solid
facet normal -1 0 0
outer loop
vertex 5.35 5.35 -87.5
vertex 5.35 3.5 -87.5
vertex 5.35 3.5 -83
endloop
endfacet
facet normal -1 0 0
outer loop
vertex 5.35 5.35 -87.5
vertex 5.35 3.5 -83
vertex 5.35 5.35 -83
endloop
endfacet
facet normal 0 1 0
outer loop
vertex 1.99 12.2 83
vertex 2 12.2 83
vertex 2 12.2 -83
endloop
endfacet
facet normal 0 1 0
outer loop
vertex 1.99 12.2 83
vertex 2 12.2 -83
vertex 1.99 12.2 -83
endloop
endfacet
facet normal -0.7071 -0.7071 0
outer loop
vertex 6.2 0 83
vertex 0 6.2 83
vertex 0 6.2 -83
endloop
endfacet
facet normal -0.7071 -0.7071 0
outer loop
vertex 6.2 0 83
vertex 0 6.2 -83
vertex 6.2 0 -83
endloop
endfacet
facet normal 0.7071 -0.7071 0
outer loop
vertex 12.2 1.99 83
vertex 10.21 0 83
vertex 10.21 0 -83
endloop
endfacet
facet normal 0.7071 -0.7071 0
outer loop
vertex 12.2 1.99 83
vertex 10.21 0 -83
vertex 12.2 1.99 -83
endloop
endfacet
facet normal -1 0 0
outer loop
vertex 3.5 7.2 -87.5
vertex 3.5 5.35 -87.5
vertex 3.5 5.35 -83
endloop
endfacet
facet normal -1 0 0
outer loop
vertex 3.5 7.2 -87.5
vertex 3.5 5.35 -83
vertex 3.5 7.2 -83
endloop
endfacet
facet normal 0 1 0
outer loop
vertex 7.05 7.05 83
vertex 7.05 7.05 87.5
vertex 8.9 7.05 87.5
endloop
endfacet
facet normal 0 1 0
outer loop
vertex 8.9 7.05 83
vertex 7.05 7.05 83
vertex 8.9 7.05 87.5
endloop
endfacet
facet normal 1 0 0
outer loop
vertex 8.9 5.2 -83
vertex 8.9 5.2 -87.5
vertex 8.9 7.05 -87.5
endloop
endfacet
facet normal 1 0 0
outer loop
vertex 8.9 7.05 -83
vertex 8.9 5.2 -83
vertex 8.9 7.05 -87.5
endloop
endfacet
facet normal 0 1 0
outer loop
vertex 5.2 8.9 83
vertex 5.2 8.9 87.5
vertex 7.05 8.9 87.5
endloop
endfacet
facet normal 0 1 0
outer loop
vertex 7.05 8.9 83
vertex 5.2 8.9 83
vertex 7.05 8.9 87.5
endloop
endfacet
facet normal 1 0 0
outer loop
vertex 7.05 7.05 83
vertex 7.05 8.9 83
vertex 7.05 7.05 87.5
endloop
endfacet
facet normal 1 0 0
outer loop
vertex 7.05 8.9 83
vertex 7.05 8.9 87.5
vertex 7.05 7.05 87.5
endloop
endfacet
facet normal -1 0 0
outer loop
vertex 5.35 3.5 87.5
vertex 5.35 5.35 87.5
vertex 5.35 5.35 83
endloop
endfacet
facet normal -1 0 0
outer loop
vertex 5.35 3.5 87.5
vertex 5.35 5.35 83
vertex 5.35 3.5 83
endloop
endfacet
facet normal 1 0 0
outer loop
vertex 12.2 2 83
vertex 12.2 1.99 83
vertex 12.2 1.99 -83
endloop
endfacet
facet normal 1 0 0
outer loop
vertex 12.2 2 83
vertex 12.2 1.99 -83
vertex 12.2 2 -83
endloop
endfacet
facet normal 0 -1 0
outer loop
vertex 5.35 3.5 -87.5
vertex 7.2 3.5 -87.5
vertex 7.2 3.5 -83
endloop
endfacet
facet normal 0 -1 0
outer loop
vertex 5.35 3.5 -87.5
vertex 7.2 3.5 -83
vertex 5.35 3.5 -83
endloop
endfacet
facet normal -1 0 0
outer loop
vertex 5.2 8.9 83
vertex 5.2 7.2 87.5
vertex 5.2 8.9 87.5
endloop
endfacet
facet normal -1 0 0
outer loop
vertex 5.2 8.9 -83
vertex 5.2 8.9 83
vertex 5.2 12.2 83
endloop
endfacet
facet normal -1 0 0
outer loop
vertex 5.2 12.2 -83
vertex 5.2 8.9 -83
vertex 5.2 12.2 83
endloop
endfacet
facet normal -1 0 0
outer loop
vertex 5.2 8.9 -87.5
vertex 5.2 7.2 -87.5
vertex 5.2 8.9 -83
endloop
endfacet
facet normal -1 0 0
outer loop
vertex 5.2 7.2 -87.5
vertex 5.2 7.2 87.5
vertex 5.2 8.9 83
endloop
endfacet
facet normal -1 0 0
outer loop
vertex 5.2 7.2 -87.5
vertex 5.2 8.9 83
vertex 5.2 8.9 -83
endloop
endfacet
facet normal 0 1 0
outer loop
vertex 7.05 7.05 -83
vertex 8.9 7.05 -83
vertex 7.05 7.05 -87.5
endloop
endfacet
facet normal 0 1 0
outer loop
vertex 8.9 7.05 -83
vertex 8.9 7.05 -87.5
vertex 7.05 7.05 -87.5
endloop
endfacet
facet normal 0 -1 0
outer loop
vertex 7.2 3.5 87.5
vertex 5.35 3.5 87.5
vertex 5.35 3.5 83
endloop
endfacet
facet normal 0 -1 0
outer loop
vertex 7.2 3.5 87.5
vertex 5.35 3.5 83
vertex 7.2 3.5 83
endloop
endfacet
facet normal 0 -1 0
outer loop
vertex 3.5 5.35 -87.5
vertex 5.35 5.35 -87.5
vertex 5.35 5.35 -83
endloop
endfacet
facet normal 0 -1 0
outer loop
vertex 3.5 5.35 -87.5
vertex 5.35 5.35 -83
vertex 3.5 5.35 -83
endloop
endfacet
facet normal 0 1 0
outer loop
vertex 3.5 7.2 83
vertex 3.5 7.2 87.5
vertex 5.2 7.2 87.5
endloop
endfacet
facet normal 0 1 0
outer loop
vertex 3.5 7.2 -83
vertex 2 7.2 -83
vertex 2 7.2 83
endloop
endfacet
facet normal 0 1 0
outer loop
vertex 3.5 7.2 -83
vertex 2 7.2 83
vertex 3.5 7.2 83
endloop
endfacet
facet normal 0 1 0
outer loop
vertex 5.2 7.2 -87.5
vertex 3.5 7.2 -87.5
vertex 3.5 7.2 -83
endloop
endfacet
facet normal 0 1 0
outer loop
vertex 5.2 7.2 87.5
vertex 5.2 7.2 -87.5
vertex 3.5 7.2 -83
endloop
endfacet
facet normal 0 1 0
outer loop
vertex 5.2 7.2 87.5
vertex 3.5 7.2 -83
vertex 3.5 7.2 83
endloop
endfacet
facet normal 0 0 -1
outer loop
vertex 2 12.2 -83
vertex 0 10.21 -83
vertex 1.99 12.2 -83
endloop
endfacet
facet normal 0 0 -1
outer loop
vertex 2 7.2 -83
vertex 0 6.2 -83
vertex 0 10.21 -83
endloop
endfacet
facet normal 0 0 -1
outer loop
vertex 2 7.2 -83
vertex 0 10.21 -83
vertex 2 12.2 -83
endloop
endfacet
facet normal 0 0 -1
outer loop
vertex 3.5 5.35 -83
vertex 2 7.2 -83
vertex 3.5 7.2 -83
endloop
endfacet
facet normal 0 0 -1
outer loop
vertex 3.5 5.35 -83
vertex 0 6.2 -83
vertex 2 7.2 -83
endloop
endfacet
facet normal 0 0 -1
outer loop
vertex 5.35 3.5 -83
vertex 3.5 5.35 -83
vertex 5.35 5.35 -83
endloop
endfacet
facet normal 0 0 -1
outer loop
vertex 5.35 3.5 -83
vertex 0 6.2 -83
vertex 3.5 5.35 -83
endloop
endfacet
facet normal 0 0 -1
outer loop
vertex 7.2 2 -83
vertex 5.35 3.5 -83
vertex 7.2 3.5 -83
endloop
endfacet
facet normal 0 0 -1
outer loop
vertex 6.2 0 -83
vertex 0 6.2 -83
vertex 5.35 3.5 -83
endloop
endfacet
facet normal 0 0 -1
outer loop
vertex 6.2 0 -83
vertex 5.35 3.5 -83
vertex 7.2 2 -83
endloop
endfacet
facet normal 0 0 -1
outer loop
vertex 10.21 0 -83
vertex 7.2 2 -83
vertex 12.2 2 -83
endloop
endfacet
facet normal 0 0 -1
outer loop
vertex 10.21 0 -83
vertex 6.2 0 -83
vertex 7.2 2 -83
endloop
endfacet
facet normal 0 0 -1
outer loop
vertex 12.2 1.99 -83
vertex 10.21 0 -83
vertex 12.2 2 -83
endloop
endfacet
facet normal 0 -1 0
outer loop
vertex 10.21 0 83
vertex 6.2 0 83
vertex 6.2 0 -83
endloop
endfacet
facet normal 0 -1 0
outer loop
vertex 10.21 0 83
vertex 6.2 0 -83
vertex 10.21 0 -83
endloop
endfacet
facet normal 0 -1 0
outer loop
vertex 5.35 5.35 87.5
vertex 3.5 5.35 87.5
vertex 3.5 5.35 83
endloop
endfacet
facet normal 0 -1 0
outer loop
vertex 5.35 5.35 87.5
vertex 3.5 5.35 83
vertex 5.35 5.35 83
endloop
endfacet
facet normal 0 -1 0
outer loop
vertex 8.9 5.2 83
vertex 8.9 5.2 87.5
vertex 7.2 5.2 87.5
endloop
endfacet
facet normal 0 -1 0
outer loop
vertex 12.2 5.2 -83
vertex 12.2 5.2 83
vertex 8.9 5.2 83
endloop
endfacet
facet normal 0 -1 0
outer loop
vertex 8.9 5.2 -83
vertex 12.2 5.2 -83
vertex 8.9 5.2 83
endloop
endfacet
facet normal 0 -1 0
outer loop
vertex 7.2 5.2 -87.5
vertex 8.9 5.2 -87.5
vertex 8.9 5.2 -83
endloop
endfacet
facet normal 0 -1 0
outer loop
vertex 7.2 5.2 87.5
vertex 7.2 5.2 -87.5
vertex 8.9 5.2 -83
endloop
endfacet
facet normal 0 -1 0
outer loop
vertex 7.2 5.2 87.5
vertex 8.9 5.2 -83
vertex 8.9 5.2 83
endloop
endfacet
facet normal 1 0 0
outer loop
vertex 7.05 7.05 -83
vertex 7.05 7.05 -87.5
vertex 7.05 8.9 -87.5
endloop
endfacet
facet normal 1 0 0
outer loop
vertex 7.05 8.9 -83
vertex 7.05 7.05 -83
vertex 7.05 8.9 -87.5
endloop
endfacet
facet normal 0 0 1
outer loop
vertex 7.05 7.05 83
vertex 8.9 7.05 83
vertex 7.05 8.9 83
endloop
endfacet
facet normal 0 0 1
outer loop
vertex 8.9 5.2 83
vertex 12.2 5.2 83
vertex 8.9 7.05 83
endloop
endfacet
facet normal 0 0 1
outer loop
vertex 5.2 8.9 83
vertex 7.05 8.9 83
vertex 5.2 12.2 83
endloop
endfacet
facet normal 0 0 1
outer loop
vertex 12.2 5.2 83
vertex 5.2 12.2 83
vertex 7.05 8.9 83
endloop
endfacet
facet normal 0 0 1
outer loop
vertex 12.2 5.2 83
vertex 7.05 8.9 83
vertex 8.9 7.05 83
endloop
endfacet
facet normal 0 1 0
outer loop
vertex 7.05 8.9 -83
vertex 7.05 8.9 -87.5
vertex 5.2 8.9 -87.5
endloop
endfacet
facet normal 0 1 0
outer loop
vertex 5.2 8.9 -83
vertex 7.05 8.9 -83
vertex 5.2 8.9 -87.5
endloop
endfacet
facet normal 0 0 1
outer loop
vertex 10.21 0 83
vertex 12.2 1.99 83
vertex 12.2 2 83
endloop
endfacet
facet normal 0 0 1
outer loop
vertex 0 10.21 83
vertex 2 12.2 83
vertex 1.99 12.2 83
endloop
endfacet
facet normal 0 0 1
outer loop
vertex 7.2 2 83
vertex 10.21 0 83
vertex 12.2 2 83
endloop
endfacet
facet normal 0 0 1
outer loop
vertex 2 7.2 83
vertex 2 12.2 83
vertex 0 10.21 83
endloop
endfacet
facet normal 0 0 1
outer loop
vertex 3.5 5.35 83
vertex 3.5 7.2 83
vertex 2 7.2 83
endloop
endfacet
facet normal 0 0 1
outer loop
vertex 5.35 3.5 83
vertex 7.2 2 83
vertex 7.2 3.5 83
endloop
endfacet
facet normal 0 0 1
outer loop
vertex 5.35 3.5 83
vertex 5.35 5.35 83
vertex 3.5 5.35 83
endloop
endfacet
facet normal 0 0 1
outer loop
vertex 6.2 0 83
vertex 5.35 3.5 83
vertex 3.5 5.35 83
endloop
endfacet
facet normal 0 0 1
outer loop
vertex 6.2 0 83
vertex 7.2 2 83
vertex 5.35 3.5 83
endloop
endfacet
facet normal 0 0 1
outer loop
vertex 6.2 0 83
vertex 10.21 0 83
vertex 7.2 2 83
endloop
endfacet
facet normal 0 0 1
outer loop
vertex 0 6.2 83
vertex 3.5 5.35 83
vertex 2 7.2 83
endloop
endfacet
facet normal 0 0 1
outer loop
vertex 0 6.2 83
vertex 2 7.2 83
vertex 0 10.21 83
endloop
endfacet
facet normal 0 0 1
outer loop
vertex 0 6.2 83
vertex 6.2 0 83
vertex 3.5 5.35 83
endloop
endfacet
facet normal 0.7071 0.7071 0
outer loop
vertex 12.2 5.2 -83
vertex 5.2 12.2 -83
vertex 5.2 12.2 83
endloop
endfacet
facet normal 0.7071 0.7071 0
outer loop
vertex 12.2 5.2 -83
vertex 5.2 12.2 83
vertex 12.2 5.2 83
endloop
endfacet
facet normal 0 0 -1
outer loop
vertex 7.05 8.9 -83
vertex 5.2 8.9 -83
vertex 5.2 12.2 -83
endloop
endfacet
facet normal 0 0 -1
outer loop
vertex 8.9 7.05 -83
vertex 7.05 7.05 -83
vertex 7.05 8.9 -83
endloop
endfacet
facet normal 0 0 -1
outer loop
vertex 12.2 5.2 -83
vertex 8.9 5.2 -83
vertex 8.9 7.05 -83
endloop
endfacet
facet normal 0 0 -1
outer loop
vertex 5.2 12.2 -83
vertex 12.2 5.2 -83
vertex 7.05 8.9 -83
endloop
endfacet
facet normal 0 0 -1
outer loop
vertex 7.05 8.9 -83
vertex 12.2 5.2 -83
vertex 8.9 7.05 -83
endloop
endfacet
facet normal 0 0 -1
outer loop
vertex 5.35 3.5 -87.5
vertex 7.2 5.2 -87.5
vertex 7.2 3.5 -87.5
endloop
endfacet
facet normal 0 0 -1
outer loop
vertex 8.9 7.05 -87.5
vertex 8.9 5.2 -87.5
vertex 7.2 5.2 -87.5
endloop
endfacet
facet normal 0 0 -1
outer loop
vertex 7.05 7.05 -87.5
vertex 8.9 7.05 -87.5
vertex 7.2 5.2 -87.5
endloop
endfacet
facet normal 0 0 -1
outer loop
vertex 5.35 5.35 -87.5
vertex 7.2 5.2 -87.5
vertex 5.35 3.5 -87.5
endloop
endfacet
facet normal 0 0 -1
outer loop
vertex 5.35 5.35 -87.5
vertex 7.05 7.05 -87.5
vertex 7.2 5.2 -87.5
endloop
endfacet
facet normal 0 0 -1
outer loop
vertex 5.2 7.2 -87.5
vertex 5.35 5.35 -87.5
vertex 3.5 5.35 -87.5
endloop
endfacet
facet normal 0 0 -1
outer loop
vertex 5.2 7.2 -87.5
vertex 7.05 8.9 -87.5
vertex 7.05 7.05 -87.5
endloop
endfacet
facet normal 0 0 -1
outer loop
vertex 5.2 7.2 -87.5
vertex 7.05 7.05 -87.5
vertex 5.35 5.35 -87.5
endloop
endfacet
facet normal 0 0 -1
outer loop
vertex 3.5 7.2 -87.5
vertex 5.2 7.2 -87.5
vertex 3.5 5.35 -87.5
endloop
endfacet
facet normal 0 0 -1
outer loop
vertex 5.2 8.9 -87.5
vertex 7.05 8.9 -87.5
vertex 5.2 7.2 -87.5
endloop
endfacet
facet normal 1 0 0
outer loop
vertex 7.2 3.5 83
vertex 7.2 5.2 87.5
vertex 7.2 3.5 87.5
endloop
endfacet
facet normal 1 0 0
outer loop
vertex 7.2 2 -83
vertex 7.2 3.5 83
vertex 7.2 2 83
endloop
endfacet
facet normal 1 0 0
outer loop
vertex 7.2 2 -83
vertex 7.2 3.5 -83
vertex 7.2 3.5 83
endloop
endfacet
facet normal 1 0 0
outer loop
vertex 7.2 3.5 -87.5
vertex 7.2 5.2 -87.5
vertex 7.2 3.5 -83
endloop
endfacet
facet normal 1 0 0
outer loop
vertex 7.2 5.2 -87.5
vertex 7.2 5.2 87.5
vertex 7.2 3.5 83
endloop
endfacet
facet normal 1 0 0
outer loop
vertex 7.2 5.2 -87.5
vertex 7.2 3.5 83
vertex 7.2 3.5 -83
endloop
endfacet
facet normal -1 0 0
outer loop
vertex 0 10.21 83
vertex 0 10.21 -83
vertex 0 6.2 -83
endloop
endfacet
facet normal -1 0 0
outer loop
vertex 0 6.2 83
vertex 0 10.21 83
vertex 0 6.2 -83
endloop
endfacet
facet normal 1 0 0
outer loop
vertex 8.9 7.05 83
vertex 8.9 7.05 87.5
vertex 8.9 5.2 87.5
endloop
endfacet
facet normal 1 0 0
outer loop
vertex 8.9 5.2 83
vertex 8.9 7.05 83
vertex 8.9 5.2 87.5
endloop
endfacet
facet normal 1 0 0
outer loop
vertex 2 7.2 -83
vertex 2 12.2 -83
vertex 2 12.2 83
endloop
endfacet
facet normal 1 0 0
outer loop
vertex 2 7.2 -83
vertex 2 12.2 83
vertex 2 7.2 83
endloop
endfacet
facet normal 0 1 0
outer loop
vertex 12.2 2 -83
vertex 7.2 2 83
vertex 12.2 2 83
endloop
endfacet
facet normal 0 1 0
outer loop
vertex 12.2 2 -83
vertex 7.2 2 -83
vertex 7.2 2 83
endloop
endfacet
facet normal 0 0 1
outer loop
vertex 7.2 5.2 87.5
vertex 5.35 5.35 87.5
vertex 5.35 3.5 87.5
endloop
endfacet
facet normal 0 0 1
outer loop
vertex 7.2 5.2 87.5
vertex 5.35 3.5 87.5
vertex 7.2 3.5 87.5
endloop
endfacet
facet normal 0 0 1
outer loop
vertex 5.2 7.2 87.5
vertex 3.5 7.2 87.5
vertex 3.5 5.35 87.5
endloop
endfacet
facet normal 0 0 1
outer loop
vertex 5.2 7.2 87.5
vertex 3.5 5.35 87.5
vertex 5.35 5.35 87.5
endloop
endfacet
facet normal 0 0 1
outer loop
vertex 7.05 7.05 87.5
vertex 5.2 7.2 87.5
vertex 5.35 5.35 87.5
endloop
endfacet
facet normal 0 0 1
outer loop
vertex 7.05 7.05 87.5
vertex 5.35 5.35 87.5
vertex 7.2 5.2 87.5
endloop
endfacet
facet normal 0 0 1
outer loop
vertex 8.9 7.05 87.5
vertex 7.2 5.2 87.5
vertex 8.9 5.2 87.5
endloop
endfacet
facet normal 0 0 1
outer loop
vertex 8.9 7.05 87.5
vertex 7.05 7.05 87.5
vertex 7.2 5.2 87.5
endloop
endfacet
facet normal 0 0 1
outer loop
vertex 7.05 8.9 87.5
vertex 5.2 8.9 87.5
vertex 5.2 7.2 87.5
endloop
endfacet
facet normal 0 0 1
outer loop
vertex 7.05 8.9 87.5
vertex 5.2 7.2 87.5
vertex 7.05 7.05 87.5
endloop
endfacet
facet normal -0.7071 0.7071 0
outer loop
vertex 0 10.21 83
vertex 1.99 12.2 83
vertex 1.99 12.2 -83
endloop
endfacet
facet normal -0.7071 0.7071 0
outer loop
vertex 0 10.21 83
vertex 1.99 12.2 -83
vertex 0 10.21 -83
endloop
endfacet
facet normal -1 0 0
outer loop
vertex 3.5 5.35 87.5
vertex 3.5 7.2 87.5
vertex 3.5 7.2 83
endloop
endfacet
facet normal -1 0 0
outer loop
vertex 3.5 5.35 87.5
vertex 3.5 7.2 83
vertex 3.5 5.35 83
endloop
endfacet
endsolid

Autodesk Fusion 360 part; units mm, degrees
sketch "Esquisse1" plane through (0, 0, 0) normal (0, 0, 1) x (1, 0, 0)
  line L0 (2, 12.2) -> (2, 7.2)
  line L1 (2, 7.2) -> (5.2, 7.2)
  line L2 (5.2, 7.2) -> (5.2, 12.2)
  line L3 (2, 12.2) -> (1.99, 12.2)
  line L4 (0, 0) -> (10.6066, 10.6066)
  line L5 (0, 0) -> (15, 0) construction
  line L6 (0, 10.21) -> (0, 6.2)
  line L7 (0, 6.2) -> (3.1, 3.1)
  line L8 (5.2, 12.2) -> (8.7, 8.7)
  line L9 (1.99, 12.2) -> (0, 10.21)
  point P0 (0, 12.2)
  dimension "d1" = 5
  dimension "d2" = 3.2
  dimension "d5" = 7.2
  dimension "d6" = 45
  dimension "d7" = 15
  dimension "d8" = 6
  dimension "d9" = 2
  dimension "d15" = 1.99
  dimension "d16" = 1.99
extrude "Extrusion1" add sketch "Esquisse1" along normal blind 87.5 makes body 1
mirror "Symétrie miroir1" about plane through (3.1, 3.1, 0) normal (-0.7071, 0.7071, 0) of bodies 1 merged
sketch "Esquisse4" plane through (0, 0, 87.5) normal (0, 0, 1) x (-1, 0, 0)
  line L0 (-2, -12.2) -> (-1.99, -12.2)
  line L1 (-1.99, -12.2) -> (0, -10.21)
  line L2 (0, -10.21) -> (0, -6.2)
  line L3 (0, -6.2) -> (-6.2, 0)
  line L4 (-6.2, 0) -> (-10.21, 0)
  line L5 (-10.21, 0) -> (-12.2, -1.99)
  line L6 (-12.2, -1.99) -> (-12.2, -2)
  line L7 (-12.2, -2) -> (-7.2, -2)
  line L8 (-7.2, -2) -> (-7.2, -5.2)
  line L9 (-7.2, -5.2) -> (-12.2, -5.2)
  line L10 (-12.2, -5.2) -> (-5.2, -12.2)
  line L11 (-5.2, -12.2) -> (-5.2, -7.2)
  line L12 (-5.2, -7.2) -> (-2, -7.2)
  line L13 (-2, -7.2) -> (-2, -12.2)
  line L14 (-5.2, -8.9) -> (-7.05, -8.9)
  line L15 (-7.05, -8.9) -> (-7.05, -7.05)
  line L16 (-7.05, -7.05) -> (-8.9, -7.05)
  line L17 (-8.9, -7.05) -> (-8.9, -5.2)
  line L18 (-5.2, -7.2) -> (-7.2, -5.2)
  line L19 (-3.5, -7.2) -> (-3.5, -5.35)
  line L20 (-3.5, -5.35) -> (-5.35, -5.35)
  line L21 (-5.35, -5.35) -> (-5.35, -3.5)
  line L22 (-5.35, -3.5) -> (-7.2, -3.5)
  point P0 (-7.2, -5.2)
  point P1 (-5.2, -7.2)
  point P2 (-7.2, -5.2)
  point P3 (-5.2, -7.2)
  dimension "d23" = 1.85
extrude "Extrusion3" cut sketch "Esquisse4" against normal blind 4.5 contours L0 L1 L2 L3 L4 L5 L6 L7 L8 L12 L13 L19 L20 L21 L22 | L9 L10 L11 L14 L15 L16 L17 bodies 1
copy_body "Corps->Comp2" bodies 1 removing the originals makes body 2 in component "Component"
mirror "Symétrie miroir1'" about plane through (0, 0, 0) normal (0, 0, -1) of bodies 2 merged in component "Component"
component "Component" placed x (1, 0, 0) y (0, 1, 0) z (0, 0, 1) at (0, 0, 0)
equation "d5 = d2 + 2 * d9"
equation "d8 = d1 + 1 mm"
equation "d10 = 92.00 mm - 4.5 mm"
equation "d16 = d15"
